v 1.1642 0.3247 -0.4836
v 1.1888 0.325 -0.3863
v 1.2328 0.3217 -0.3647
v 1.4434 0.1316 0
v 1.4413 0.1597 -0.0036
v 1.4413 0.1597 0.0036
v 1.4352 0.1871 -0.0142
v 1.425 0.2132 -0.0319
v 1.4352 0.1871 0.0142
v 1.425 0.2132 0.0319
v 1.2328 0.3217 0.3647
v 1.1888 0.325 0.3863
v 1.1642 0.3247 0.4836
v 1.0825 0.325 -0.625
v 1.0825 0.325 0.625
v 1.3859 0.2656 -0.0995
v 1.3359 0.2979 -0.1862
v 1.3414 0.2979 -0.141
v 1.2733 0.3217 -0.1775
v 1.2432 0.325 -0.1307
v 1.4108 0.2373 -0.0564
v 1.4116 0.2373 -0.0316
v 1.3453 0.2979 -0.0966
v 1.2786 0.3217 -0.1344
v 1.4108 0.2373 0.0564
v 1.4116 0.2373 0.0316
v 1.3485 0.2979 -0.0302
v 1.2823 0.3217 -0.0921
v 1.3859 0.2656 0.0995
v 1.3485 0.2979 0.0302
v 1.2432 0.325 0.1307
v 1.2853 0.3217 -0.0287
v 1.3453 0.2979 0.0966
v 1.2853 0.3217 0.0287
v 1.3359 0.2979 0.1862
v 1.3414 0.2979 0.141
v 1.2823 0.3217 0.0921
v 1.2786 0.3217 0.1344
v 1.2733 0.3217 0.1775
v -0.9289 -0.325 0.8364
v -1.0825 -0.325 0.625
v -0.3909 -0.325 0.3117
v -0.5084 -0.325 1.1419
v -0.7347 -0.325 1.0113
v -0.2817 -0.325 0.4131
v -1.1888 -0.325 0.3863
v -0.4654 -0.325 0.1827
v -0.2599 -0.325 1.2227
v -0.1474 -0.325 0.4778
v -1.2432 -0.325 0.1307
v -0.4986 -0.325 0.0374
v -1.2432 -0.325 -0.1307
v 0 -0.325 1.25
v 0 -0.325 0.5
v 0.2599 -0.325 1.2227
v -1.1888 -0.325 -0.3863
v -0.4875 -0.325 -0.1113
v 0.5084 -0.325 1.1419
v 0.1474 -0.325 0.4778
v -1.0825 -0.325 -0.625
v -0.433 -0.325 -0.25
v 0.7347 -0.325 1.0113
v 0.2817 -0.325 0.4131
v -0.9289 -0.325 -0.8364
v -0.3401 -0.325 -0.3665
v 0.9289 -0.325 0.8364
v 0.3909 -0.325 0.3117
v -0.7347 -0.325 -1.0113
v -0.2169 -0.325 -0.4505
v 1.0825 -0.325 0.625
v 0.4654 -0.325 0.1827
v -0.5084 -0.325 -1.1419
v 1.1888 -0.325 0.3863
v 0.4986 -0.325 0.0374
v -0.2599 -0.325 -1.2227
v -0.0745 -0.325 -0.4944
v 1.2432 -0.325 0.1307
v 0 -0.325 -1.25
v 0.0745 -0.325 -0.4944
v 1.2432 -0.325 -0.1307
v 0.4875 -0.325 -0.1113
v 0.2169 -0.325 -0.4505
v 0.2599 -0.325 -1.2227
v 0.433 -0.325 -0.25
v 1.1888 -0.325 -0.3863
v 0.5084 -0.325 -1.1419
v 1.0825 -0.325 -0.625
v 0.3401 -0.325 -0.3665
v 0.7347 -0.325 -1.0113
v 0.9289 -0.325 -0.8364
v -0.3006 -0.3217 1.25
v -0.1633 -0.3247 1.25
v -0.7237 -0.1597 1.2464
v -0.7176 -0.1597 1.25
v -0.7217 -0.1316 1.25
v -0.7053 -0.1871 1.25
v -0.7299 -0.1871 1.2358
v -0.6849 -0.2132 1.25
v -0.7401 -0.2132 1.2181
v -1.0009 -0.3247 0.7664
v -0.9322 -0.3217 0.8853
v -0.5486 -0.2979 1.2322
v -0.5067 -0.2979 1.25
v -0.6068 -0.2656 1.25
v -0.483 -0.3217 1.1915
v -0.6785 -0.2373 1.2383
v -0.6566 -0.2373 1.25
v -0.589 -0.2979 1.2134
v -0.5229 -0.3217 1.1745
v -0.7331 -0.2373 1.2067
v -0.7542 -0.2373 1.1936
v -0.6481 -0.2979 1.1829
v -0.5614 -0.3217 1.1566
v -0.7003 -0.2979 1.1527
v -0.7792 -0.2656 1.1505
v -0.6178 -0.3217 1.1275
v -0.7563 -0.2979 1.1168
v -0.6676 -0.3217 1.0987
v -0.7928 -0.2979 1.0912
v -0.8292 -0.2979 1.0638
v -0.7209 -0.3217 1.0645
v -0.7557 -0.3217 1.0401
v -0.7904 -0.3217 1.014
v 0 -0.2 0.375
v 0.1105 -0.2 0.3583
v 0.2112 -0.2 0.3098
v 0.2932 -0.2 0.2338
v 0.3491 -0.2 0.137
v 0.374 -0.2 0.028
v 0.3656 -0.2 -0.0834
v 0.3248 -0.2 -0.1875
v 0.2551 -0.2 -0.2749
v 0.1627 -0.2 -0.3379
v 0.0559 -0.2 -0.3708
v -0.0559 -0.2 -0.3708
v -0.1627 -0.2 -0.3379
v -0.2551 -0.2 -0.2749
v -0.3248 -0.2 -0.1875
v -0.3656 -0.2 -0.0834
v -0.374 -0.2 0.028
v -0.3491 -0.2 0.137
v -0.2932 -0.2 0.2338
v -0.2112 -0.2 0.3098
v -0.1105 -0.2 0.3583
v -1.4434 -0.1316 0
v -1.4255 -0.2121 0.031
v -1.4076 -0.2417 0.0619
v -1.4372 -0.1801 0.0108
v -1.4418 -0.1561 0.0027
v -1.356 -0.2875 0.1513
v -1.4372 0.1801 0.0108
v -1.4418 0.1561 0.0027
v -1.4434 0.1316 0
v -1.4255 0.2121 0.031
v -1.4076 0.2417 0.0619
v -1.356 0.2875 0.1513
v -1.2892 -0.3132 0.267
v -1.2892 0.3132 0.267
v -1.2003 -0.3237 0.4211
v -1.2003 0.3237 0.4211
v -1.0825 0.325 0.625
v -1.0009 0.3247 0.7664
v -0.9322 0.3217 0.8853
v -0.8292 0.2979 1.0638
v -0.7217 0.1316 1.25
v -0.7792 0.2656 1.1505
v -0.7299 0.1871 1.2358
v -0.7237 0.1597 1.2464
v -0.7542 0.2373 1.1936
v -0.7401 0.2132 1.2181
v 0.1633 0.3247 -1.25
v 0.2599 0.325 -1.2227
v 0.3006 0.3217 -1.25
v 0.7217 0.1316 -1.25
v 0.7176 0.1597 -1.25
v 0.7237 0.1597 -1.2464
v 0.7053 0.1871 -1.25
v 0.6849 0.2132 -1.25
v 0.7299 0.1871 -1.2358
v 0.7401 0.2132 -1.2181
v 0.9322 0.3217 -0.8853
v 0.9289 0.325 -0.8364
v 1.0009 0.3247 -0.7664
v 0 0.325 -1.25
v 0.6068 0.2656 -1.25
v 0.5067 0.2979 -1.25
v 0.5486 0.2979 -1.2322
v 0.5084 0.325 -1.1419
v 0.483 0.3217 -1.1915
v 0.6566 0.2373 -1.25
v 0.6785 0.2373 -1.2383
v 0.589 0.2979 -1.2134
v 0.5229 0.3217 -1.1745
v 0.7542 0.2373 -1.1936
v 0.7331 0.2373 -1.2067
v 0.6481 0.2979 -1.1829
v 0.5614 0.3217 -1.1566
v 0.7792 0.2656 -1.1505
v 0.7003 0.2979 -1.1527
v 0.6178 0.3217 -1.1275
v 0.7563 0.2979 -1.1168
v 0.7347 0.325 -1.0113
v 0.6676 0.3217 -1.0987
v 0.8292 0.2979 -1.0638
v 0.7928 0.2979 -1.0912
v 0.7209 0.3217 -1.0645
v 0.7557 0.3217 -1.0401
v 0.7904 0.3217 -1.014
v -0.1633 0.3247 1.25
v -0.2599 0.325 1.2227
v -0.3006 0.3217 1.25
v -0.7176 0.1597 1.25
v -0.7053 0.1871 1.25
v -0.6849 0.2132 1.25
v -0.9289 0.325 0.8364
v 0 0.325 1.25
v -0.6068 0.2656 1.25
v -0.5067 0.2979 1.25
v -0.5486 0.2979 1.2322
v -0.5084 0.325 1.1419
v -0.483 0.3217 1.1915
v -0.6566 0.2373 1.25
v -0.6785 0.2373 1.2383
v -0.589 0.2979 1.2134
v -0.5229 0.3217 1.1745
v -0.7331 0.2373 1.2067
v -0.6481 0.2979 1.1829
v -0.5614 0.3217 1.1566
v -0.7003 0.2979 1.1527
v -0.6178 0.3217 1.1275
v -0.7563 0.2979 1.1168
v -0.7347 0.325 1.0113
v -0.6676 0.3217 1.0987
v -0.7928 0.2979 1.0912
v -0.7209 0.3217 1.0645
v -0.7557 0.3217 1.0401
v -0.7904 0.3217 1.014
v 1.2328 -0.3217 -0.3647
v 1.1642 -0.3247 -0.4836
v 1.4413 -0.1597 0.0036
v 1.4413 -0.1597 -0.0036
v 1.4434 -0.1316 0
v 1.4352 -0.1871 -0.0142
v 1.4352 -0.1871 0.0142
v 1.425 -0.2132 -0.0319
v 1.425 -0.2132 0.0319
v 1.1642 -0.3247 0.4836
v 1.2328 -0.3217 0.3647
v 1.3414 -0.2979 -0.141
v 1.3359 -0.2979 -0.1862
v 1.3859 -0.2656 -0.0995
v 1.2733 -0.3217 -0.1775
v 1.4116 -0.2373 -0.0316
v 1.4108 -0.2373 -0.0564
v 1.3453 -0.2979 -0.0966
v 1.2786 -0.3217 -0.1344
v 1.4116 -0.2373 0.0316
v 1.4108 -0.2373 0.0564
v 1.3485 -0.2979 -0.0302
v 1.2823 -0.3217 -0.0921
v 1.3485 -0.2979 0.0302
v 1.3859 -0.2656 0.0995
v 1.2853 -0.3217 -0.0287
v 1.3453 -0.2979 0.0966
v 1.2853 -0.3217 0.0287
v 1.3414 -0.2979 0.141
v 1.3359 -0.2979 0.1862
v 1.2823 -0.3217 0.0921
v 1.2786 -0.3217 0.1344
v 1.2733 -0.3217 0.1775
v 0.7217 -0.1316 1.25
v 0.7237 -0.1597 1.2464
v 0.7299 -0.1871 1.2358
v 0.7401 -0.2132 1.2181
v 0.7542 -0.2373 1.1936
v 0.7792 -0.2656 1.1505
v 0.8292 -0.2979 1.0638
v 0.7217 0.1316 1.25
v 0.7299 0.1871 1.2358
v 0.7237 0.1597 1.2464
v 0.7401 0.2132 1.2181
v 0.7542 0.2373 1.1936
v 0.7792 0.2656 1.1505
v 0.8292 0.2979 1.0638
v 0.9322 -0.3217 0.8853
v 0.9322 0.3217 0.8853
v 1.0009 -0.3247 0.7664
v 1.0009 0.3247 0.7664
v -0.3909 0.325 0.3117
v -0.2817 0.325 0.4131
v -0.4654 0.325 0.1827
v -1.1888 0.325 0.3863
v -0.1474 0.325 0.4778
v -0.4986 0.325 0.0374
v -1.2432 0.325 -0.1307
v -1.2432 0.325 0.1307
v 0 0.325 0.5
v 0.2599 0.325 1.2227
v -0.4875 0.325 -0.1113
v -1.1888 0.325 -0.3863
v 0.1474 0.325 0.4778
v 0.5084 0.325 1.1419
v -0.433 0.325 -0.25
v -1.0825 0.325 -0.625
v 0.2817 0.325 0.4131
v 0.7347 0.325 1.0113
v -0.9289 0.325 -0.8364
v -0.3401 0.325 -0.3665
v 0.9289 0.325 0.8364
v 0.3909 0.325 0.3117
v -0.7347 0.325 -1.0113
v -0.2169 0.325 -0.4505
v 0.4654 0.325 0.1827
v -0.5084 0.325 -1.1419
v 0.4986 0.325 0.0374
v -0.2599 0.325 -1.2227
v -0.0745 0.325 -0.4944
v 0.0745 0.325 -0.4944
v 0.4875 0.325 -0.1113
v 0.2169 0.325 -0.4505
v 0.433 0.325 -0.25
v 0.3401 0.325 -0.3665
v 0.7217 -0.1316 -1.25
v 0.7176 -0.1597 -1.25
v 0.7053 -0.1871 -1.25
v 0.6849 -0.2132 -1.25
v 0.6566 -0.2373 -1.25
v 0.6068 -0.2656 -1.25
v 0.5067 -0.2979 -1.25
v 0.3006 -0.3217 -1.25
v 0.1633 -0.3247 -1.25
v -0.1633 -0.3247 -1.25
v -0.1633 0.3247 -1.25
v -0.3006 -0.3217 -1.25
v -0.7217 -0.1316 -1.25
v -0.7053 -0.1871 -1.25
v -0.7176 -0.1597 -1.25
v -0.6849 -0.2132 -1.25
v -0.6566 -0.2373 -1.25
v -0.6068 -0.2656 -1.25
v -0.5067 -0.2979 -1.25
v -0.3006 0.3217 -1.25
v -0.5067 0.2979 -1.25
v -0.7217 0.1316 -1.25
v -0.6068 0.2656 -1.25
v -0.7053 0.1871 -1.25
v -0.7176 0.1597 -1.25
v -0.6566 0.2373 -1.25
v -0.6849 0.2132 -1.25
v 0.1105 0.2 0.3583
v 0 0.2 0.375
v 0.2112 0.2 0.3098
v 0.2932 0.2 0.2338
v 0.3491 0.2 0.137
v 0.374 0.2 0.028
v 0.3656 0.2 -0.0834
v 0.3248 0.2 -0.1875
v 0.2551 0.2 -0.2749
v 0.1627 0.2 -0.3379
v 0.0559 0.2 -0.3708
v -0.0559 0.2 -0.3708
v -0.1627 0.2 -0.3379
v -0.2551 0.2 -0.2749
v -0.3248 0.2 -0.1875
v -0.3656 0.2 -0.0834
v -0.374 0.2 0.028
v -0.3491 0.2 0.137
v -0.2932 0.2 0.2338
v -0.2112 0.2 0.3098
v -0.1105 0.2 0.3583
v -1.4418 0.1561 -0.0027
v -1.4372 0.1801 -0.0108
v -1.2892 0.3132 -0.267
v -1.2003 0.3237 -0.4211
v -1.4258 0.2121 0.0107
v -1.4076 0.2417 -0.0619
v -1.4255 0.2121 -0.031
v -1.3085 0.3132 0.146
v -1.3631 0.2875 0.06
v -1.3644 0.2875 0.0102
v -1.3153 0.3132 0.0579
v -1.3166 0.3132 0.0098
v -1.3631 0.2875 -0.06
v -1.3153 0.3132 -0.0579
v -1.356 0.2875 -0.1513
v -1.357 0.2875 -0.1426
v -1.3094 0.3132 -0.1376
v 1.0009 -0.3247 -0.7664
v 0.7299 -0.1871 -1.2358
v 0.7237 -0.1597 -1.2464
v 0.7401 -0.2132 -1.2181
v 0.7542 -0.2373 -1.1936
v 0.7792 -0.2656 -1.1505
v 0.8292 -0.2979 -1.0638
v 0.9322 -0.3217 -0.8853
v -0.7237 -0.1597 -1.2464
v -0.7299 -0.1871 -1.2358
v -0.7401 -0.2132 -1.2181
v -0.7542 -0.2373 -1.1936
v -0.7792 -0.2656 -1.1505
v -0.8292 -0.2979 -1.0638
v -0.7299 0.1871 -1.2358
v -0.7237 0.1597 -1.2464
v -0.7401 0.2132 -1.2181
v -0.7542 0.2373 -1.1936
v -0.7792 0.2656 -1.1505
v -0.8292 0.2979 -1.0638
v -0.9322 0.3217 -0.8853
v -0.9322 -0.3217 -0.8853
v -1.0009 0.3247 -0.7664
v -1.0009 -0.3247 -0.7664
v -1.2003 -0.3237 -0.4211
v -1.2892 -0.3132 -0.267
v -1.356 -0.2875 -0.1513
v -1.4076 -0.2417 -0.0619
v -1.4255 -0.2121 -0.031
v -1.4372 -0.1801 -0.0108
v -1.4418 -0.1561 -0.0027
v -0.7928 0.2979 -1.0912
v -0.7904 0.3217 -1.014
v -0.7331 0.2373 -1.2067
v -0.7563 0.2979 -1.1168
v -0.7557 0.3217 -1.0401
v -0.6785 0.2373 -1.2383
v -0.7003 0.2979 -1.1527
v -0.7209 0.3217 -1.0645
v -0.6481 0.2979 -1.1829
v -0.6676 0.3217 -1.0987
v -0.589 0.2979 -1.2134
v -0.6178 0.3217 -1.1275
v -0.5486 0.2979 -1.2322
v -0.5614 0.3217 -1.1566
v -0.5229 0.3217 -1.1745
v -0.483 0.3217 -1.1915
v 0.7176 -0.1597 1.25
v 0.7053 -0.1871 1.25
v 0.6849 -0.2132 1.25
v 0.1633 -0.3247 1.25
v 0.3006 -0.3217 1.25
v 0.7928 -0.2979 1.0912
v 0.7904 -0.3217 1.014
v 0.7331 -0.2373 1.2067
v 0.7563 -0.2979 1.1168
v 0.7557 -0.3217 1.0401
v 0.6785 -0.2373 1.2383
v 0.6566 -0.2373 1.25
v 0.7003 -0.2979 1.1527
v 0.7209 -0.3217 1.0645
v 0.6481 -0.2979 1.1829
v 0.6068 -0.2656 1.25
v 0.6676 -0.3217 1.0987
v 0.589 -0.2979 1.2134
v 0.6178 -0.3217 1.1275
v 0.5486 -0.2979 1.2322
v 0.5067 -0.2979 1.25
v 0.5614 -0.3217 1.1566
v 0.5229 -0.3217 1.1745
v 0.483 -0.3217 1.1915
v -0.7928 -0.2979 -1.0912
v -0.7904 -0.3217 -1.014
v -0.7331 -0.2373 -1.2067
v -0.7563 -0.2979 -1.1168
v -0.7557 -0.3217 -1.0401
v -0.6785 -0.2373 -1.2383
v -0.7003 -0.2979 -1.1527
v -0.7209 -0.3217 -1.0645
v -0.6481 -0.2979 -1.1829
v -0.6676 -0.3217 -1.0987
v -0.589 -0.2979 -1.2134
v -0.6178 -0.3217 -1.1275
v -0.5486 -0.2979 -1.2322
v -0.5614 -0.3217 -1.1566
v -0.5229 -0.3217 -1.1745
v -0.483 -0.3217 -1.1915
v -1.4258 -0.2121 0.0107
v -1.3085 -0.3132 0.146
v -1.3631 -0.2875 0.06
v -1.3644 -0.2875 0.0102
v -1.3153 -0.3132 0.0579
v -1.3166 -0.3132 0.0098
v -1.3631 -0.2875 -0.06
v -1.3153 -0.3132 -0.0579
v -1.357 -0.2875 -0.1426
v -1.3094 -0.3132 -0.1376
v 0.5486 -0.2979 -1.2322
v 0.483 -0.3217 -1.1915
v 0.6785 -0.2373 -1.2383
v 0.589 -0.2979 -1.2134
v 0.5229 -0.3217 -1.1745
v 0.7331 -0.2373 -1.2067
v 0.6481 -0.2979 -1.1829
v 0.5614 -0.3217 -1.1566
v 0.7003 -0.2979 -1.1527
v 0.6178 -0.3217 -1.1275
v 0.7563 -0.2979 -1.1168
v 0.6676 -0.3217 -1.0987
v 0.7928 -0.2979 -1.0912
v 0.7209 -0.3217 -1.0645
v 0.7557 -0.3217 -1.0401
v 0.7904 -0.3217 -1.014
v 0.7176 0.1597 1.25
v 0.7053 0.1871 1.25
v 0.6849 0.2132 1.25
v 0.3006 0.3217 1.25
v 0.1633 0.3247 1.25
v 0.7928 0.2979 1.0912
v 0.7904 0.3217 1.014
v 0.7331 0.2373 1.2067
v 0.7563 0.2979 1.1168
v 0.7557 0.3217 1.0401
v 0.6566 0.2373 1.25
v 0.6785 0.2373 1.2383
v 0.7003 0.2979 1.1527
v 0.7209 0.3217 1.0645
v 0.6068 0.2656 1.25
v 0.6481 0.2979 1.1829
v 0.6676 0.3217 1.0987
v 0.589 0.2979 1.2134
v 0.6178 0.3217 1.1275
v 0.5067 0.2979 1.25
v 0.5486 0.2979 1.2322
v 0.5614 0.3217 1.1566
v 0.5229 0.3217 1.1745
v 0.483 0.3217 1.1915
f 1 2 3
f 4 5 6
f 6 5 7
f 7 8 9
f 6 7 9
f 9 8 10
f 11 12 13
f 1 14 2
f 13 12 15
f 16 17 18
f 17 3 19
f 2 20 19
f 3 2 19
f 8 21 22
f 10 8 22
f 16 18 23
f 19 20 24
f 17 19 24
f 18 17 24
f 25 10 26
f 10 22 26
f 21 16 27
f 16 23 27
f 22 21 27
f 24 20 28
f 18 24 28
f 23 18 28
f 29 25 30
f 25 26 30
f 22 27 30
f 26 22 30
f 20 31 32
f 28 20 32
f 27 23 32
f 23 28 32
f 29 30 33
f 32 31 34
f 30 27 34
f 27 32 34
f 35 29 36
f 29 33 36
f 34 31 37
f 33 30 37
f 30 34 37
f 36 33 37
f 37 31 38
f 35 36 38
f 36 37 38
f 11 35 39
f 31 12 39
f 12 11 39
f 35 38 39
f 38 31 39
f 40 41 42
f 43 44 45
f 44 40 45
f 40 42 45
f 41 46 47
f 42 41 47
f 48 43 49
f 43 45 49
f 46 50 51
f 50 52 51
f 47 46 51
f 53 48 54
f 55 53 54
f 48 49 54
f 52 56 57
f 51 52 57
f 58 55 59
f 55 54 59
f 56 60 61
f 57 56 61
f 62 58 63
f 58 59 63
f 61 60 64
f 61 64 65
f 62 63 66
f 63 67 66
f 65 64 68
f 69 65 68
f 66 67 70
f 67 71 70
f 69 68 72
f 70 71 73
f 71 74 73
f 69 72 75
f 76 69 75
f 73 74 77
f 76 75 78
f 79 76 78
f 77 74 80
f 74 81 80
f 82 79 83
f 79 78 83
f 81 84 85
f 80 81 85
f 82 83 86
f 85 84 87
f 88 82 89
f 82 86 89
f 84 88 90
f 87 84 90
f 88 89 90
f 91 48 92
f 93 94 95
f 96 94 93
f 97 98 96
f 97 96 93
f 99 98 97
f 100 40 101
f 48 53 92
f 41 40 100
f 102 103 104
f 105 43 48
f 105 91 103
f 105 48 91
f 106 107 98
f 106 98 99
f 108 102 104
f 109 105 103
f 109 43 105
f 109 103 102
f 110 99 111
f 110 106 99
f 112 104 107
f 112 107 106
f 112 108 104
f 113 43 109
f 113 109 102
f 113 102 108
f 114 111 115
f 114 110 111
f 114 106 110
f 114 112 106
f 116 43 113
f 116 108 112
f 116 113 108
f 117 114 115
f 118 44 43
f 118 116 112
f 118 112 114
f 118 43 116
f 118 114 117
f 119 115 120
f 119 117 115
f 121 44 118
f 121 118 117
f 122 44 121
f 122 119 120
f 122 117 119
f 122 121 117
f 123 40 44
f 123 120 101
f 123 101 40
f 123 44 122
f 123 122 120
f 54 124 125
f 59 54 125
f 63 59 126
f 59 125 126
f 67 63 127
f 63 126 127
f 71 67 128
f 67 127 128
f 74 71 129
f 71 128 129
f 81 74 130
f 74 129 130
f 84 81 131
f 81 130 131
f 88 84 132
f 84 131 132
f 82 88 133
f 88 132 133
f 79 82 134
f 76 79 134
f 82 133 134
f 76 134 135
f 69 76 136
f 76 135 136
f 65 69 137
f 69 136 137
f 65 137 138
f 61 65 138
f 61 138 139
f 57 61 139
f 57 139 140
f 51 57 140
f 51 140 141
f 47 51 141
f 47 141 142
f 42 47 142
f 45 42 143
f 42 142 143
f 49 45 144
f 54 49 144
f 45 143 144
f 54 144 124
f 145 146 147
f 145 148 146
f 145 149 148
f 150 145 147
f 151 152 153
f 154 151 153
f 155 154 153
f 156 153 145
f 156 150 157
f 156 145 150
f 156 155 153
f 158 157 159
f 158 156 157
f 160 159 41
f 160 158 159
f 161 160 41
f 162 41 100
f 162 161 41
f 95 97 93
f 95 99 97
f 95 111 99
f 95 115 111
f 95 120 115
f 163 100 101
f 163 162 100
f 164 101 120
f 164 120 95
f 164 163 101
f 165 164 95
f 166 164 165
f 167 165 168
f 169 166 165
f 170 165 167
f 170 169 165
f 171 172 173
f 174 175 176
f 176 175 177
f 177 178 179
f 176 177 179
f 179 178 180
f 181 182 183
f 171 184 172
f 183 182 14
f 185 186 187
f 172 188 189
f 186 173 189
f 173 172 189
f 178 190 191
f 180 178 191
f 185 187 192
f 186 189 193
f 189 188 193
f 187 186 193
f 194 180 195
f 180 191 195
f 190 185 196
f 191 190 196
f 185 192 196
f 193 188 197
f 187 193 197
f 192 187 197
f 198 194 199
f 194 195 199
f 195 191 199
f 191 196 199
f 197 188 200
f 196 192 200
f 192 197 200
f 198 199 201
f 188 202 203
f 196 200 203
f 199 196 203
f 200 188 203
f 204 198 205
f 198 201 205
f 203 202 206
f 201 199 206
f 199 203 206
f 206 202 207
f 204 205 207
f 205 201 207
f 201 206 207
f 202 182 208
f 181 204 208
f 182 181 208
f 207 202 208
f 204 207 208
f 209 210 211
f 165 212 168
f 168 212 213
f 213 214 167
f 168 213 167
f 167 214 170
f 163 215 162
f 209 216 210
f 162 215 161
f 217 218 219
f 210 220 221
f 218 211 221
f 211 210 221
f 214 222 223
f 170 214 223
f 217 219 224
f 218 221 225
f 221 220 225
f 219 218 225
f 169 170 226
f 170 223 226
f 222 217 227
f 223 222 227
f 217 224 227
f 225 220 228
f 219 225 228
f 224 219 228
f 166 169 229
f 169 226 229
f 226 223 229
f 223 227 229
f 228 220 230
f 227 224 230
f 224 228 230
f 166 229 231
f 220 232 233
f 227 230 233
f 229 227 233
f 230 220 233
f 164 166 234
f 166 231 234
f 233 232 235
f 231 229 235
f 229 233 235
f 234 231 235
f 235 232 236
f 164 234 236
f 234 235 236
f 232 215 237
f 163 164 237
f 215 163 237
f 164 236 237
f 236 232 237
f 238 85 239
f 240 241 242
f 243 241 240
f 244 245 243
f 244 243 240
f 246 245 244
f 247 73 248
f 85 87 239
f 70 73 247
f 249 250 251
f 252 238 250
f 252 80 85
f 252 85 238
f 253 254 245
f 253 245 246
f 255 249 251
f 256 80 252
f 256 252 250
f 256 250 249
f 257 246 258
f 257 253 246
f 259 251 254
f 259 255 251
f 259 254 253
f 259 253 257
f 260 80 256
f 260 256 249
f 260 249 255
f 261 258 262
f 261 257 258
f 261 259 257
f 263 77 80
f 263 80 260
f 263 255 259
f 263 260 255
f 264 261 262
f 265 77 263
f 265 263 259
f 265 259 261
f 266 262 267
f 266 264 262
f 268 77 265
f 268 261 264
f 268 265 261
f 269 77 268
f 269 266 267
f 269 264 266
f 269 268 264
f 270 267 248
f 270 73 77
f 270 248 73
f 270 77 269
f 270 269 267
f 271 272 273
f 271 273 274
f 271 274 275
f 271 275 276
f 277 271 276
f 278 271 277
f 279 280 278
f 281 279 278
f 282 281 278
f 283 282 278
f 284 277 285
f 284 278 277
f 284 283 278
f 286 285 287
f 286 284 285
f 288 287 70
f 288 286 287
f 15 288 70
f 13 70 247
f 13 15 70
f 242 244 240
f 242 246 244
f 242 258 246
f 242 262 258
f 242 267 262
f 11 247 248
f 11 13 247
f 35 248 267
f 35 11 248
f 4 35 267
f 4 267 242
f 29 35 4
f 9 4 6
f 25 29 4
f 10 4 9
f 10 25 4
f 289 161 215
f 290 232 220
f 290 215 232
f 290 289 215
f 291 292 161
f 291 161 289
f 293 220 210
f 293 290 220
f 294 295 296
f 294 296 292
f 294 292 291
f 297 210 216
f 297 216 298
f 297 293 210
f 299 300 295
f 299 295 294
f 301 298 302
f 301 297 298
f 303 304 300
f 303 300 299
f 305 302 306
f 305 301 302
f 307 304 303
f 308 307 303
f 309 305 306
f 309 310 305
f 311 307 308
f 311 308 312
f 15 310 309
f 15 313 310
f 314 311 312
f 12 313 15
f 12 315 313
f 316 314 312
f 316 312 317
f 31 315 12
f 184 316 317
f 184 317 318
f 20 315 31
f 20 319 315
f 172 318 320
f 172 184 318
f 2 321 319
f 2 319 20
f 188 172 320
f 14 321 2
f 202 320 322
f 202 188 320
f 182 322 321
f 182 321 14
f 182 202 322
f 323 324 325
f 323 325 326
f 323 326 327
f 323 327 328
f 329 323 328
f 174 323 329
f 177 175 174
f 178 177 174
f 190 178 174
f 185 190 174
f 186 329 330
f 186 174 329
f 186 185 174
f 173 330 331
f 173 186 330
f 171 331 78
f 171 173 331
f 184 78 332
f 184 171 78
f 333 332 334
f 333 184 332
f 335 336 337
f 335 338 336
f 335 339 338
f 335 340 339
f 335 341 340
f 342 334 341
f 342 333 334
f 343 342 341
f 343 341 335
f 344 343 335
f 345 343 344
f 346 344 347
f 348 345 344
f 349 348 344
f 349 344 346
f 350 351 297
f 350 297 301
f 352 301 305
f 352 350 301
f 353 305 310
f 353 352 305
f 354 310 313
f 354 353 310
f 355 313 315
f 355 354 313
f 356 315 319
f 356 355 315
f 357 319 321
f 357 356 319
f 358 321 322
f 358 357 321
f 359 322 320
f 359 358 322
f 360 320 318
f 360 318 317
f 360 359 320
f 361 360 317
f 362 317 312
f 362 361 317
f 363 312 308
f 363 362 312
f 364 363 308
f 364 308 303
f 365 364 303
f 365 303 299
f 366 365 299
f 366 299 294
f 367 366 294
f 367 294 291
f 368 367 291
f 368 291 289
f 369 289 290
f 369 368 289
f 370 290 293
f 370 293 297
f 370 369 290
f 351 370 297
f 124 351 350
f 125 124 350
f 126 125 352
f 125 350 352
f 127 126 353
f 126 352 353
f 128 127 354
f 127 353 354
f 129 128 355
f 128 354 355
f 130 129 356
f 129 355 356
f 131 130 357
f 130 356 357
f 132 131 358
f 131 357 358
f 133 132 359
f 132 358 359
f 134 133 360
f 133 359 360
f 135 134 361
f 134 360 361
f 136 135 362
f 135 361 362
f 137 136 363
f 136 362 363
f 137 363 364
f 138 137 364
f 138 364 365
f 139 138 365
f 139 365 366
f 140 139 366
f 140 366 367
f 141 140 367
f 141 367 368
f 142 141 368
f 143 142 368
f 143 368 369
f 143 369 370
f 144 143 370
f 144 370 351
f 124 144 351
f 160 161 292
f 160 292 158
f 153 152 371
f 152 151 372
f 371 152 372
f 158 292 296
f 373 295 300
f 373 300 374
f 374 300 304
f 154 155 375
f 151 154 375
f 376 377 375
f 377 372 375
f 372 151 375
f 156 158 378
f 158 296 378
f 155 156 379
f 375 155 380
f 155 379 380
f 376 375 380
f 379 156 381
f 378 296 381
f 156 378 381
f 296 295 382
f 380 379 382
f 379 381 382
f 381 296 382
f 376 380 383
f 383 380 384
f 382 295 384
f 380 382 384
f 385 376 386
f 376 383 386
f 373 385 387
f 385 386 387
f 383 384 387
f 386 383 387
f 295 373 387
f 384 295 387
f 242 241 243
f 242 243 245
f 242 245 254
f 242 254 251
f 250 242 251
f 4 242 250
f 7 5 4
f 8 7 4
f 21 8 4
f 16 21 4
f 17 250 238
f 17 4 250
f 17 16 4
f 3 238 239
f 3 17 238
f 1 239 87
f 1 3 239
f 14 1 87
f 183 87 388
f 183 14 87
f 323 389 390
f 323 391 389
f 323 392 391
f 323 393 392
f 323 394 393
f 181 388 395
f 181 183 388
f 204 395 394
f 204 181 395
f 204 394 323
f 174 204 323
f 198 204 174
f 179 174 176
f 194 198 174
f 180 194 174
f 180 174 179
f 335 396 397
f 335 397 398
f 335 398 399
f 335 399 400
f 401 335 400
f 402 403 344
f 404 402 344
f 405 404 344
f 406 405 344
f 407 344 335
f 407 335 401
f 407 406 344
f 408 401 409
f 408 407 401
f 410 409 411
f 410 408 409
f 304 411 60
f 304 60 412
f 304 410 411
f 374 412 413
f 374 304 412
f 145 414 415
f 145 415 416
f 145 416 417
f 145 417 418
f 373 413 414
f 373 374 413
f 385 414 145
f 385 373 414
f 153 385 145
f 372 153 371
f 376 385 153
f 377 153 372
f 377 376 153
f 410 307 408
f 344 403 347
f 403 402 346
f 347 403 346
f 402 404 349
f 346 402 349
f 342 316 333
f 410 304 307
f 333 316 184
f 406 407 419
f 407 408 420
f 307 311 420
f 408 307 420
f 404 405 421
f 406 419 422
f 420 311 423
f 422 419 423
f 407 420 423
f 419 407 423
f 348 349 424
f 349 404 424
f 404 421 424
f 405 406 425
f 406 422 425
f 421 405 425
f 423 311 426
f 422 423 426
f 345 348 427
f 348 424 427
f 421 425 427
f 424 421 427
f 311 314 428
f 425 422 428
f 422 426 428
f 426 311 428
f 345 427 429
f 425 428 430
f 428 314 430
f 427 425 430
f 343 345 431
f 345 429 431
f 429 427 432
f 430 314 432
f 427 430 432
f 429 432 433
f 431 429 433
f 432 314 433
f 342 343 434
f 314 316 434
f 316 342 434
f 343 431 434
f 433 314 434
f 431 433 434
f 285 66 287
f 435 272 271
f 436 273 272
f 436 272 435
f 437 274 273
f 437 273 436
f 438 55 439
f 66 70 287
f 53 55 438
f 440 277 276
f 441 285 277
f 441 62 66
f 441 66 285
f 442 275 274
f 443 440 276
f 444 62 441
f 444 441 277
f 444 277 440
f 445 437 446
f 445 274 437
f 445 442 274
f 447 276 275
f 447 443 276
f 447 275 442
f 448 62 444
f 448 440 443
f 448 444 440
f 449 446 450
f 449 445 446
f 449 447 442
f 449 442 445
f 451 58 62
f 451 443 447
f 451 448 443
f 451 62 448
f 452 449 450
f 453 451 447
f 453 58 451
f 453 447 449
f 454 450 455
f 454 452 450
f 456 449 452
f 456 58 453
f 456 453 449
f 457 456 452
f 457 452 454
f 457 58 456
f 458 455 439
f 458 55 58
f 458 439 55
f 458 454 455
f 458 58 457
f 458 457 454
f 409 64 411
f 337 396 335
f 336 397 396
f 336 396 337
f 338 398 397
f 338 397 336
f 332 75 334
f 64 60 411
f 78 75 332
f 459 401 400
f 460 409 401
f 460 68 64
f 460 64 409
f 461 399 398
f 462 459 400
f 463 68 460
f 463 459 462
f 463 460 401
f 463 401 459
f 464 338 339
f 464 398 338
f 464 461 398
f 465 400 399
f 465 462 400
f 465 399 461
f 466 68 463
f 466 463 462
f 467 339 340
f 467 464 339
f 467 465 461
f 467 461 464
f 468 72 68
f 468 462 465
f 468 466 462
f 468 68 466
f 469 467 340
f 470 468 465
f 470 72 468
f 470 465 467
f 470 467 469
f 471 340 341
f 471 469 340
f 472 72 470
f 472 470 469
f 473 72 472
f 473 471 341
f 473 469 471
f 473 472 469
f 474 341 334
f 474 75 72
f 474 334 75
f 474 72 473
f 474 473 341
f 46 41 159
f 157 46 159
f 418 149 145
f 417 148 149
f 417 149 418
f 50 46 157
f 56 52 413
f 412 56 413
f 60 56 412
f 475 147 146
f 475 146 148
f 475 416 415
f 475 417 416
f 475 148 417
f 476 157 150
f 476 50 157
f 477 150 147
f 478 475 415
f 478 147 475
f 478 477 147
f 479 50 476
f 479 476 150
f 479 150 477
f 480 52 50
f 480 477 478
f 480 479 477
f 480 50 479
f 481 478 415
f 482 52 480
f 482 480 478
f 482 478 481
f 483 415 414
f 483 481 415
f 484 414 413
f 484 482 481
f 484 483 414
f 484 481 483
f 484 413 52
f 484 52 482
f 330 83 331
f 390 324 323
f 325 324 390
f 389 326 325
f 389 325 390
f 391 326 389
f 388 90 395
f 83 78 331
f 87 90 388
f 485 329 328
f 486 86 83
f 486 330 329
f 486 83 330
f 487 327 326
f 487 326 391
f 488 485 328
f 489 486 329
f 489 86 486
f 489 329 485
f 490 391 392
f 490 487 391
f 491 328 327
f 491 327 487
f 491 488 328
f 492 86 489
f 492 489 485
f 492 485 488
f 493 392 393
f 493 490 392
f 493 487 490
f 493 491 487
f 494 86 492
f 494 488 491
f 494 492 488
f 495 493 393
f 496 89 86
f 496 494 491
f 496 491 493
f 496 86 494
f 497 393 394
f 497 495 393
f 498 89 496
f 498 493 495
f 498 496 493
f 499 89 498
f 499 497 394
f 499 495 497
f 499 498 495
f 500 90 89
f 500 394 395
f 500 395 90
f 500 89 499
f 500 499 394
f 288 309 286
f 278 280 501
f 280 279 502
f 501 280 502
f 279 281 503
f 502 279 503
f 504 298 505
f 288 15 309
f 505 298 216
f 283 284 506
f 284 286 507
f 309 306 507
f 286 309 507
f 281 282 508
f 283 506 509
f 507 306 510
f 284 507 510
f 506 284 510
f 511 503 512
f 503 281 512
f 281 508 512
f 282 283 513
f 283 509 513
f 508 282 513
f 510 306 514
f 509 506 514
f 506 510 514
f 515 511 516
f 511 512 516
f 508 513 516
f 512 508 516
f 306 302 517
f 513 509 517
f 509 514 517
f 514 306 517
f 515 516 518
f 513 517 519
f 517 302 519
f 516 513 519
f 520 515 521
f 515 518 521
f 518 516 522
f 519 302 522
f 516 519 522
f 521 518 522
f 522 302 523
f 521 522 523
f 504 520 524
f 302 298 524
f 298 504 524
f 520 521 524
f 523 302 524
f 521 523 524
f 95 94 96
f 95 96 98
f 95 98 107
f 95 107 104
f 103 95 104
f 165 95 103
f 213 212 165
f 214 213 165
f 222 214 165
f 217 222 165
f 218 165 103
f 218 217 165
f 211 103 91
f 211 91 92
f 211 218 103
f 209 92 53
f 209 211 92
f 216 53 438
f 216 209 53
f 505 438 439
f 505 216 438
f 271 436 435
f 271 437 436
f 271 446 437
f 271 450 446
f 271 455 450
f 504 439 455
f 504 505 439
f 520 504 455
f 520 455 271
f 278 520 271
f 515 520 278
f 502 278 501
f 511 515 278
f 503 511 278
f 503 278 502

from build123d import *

# Parameters (mm, degrees)
BOSS_EXTRUDE1_DEPTH = 0.325
SKETCH6_R           = 0.375
CUT_EXTRUDE1_DEPTH  = 3.017011156
CHAMFER1_SIZE       = 0.125


with BuildPart() as part:
    # Sketch1 → Boss-Extrude1 (new, symmetric)
    with BuildSketch(Plane(origin=(0, 0, 0), x_dir=(1, 0, 0), z_dir=(0, 1, 0))):
        Polygon((1.443375673, 0), (0.721687836, 1.25), (-0.721687836, 1.25), (-1.443375673, 0), (-0.721687836, -1.25), (0.721687836, -1.25), align=None)
    extrude(amount=BOSS_EXTRUDE1_DEPTH, both=True)

    # Sketch3 → Cut-Revolve1 (revolve, cut)
    with BuildSketch(Plane.XY):
        with BuildLine():
            Line((-1.443375673, 0.325), (-1.443375673, 0.131624327))
            ThreePointArc((-1.443375673, 0.131624327), (-1.38673725, 0.268361577), (-1.25, 0.325))
            Line((-1.25, 0.325), (-1.443375673, 0.325))
        make_face()
    cut_revolve1 = revolve(axis=Axis((0, 0, 0), (0, -1, 0)), mode=Mode.SUBTRACT)

    # Mirror1: Cut-Revolve1 across plane
    add(cut_revolve1.mirror(Plane.ZX), mode=Mode.SUBTRACT)

    # Sketch6 → Cut-Extrude1 (cut, through all)
    with BuildSketch(Plane(origin=(0, 0.325, 0), x_dir=(1, 0, 0), z_dir=(0, 1, 0))):
        with Locations(Location((0, 0, 0), (0, 0, 270))):
            Circle(SKETCH6_R)
    extrude(amount=-CUT_EXTRUDE1_DEPTH, mode=Mode.SUBTRACT)

    # Chamfer1
    chamfer1_edges = [part.edges().sort_by_distance(p)[0] for p in [
        (0, -0.325, -0.375),
        (0, 0.325, -0.375),
    ]]
    chamfer(chamfer1_edges, length=CHAMFER1_SIZE)


solid = part.part
